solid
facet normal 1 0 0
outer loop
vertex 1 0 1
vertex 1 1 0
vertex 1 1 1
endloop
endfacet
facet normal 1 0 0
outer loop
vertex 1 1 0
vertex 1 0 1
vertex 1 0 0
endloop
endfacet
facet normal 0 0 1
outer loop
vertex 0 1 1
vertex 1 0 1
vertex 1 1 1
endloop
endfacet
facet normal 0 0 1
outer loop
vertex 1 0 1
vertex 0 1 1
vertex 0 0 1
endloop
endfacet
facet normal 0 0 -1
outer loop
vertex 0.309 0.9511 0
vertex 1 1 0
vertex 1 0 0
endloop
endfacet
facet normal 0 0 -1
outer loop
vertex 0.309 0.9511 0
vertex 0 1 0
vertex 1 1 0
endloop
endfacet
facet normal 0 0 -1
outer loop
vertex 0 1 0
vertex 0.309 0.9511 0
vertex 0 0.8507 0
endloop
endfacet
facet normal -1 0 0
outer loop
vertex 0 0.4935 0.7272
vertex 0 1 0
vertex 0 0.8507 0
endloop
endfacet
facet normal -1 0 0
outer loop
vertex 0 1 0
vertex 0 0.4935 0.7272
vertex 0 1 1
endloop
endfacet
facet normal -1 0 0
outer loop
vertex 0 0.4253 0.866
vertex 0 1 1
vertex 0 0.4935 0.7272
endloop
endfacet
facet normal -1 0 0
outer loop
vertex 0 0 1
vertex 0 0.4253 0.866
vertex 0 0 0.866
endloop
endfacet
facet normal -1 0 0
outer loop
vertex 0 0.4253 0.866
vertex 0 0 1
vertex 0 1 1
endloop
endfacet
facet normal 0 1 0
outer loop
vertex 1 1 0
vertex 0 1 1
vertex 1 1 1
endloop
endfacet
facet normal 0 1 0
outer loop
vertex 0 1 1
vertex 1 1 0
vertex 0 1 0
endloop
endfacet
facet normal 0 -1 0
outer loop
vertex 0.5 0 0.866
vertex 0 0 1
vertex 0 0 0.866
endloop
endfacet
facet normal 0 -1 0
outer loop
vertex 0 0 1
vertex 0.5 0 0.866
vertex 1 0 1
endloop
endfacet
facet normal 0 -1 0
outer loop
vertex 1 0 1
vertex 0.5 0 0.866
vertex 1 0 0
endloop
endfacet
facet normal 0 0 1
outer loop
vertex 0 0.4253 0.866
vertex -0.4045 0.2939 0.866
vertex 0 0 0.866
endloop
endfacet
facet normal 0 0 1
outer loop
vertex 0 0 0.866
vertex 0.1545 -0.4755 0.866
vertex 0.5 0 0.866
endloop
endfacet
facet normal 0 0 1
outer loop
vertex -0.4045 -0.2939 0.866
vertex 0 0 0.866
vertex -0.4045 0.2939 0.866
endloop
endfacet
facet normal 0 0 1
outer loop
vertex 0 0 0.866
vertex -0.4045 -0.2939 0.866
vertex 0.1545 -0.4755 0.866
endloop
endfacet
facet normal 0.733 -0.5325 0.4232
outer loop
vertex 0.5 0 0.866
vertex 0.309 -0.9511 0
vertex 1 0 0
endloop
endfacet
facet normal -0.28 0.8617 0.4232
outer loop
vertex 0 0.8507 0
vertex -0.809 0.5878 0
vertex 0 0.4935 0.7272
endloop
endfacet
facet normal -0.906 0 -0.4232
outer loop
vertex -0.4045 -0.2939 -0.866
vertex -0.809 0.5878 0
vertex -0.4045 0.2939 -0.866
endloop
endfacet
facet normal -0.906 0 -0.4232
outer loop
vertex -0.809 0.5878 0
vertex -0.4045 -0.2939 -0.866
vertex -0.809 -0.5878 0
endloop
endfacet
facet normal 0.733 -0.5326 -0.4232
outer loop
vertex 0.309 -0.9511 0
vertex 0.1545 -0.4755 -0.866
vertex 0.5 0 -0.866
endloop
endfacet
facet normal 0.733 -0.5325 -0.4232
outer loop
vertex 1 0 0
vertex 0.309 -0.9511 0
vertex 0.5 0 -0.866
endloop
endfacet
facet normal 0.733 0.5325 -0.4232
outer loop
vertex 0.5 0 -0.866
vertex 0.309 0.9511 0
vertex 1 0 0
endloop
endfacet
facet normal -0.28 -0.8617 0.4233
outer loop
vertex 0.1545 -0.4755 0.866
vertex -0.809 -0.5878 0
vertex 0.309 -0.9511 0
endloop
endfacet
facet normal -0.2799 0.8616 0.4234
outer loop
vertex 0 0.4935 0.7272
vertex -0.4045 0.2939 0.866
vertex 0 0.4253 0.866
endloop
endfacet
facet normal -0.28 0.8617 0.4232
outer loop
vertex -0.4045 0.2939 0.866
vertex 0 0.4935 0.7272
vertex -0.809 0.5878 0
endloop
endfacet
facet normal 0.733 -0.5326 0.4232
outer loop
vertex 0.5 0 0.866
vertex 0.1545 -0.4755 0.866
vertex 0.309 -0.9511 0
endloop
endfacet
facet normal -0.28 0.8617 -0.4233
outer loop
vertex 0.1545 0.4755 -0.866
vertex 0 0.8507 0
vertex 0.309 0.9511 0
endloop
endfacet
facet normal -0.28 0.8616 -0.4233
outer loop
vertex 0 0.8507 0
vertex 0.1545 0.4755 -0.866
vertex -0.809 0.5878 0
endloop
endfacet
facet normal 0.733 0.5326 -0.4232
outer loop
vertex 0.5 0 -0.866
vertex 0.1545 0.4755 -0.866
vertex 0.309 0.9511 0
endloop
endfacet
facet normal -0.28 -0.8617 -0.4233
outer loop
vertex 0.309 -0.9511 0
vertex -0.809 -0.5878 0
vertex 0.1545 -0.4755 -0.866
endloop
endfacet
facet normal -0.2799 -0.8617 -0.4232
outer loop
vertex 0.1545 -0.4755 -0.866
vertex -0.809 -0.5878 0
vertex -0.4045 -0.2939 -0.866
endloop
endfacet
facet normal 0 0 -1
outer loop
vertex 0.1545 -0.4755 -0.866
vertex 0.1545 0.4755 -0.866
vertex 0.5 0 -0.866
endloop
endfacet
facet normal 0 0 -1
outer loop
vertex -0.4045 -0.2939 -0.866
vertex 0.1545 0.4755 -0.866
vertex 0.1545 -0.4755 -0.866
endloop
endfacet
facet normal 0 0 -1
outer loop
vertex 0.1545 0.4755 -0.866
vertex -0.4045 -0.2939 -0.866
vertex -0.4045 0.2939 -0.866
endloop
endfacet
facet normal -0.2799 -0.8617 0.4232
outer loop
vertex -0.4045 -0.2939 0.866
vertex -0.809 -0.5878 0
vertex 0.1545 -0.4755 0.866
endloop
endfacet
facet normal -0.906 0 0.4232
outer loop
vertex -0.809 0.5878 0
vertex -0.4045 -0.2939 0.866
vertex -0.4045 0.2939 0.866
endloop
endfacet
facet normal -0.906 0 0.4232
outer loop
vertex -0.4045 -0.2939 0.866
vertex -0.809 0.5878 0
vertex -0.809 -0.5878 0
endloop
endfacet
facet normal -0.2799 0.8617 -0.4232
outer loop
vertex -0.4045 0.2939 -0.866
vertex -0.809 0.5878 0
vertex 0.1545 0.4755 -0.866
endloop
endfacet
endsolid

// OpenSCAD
union() { cube(); sphere(); }
difference() { cube(); sphere(); }
intersection() { cube(); sphere(); }
union() {}
difference() cube();
